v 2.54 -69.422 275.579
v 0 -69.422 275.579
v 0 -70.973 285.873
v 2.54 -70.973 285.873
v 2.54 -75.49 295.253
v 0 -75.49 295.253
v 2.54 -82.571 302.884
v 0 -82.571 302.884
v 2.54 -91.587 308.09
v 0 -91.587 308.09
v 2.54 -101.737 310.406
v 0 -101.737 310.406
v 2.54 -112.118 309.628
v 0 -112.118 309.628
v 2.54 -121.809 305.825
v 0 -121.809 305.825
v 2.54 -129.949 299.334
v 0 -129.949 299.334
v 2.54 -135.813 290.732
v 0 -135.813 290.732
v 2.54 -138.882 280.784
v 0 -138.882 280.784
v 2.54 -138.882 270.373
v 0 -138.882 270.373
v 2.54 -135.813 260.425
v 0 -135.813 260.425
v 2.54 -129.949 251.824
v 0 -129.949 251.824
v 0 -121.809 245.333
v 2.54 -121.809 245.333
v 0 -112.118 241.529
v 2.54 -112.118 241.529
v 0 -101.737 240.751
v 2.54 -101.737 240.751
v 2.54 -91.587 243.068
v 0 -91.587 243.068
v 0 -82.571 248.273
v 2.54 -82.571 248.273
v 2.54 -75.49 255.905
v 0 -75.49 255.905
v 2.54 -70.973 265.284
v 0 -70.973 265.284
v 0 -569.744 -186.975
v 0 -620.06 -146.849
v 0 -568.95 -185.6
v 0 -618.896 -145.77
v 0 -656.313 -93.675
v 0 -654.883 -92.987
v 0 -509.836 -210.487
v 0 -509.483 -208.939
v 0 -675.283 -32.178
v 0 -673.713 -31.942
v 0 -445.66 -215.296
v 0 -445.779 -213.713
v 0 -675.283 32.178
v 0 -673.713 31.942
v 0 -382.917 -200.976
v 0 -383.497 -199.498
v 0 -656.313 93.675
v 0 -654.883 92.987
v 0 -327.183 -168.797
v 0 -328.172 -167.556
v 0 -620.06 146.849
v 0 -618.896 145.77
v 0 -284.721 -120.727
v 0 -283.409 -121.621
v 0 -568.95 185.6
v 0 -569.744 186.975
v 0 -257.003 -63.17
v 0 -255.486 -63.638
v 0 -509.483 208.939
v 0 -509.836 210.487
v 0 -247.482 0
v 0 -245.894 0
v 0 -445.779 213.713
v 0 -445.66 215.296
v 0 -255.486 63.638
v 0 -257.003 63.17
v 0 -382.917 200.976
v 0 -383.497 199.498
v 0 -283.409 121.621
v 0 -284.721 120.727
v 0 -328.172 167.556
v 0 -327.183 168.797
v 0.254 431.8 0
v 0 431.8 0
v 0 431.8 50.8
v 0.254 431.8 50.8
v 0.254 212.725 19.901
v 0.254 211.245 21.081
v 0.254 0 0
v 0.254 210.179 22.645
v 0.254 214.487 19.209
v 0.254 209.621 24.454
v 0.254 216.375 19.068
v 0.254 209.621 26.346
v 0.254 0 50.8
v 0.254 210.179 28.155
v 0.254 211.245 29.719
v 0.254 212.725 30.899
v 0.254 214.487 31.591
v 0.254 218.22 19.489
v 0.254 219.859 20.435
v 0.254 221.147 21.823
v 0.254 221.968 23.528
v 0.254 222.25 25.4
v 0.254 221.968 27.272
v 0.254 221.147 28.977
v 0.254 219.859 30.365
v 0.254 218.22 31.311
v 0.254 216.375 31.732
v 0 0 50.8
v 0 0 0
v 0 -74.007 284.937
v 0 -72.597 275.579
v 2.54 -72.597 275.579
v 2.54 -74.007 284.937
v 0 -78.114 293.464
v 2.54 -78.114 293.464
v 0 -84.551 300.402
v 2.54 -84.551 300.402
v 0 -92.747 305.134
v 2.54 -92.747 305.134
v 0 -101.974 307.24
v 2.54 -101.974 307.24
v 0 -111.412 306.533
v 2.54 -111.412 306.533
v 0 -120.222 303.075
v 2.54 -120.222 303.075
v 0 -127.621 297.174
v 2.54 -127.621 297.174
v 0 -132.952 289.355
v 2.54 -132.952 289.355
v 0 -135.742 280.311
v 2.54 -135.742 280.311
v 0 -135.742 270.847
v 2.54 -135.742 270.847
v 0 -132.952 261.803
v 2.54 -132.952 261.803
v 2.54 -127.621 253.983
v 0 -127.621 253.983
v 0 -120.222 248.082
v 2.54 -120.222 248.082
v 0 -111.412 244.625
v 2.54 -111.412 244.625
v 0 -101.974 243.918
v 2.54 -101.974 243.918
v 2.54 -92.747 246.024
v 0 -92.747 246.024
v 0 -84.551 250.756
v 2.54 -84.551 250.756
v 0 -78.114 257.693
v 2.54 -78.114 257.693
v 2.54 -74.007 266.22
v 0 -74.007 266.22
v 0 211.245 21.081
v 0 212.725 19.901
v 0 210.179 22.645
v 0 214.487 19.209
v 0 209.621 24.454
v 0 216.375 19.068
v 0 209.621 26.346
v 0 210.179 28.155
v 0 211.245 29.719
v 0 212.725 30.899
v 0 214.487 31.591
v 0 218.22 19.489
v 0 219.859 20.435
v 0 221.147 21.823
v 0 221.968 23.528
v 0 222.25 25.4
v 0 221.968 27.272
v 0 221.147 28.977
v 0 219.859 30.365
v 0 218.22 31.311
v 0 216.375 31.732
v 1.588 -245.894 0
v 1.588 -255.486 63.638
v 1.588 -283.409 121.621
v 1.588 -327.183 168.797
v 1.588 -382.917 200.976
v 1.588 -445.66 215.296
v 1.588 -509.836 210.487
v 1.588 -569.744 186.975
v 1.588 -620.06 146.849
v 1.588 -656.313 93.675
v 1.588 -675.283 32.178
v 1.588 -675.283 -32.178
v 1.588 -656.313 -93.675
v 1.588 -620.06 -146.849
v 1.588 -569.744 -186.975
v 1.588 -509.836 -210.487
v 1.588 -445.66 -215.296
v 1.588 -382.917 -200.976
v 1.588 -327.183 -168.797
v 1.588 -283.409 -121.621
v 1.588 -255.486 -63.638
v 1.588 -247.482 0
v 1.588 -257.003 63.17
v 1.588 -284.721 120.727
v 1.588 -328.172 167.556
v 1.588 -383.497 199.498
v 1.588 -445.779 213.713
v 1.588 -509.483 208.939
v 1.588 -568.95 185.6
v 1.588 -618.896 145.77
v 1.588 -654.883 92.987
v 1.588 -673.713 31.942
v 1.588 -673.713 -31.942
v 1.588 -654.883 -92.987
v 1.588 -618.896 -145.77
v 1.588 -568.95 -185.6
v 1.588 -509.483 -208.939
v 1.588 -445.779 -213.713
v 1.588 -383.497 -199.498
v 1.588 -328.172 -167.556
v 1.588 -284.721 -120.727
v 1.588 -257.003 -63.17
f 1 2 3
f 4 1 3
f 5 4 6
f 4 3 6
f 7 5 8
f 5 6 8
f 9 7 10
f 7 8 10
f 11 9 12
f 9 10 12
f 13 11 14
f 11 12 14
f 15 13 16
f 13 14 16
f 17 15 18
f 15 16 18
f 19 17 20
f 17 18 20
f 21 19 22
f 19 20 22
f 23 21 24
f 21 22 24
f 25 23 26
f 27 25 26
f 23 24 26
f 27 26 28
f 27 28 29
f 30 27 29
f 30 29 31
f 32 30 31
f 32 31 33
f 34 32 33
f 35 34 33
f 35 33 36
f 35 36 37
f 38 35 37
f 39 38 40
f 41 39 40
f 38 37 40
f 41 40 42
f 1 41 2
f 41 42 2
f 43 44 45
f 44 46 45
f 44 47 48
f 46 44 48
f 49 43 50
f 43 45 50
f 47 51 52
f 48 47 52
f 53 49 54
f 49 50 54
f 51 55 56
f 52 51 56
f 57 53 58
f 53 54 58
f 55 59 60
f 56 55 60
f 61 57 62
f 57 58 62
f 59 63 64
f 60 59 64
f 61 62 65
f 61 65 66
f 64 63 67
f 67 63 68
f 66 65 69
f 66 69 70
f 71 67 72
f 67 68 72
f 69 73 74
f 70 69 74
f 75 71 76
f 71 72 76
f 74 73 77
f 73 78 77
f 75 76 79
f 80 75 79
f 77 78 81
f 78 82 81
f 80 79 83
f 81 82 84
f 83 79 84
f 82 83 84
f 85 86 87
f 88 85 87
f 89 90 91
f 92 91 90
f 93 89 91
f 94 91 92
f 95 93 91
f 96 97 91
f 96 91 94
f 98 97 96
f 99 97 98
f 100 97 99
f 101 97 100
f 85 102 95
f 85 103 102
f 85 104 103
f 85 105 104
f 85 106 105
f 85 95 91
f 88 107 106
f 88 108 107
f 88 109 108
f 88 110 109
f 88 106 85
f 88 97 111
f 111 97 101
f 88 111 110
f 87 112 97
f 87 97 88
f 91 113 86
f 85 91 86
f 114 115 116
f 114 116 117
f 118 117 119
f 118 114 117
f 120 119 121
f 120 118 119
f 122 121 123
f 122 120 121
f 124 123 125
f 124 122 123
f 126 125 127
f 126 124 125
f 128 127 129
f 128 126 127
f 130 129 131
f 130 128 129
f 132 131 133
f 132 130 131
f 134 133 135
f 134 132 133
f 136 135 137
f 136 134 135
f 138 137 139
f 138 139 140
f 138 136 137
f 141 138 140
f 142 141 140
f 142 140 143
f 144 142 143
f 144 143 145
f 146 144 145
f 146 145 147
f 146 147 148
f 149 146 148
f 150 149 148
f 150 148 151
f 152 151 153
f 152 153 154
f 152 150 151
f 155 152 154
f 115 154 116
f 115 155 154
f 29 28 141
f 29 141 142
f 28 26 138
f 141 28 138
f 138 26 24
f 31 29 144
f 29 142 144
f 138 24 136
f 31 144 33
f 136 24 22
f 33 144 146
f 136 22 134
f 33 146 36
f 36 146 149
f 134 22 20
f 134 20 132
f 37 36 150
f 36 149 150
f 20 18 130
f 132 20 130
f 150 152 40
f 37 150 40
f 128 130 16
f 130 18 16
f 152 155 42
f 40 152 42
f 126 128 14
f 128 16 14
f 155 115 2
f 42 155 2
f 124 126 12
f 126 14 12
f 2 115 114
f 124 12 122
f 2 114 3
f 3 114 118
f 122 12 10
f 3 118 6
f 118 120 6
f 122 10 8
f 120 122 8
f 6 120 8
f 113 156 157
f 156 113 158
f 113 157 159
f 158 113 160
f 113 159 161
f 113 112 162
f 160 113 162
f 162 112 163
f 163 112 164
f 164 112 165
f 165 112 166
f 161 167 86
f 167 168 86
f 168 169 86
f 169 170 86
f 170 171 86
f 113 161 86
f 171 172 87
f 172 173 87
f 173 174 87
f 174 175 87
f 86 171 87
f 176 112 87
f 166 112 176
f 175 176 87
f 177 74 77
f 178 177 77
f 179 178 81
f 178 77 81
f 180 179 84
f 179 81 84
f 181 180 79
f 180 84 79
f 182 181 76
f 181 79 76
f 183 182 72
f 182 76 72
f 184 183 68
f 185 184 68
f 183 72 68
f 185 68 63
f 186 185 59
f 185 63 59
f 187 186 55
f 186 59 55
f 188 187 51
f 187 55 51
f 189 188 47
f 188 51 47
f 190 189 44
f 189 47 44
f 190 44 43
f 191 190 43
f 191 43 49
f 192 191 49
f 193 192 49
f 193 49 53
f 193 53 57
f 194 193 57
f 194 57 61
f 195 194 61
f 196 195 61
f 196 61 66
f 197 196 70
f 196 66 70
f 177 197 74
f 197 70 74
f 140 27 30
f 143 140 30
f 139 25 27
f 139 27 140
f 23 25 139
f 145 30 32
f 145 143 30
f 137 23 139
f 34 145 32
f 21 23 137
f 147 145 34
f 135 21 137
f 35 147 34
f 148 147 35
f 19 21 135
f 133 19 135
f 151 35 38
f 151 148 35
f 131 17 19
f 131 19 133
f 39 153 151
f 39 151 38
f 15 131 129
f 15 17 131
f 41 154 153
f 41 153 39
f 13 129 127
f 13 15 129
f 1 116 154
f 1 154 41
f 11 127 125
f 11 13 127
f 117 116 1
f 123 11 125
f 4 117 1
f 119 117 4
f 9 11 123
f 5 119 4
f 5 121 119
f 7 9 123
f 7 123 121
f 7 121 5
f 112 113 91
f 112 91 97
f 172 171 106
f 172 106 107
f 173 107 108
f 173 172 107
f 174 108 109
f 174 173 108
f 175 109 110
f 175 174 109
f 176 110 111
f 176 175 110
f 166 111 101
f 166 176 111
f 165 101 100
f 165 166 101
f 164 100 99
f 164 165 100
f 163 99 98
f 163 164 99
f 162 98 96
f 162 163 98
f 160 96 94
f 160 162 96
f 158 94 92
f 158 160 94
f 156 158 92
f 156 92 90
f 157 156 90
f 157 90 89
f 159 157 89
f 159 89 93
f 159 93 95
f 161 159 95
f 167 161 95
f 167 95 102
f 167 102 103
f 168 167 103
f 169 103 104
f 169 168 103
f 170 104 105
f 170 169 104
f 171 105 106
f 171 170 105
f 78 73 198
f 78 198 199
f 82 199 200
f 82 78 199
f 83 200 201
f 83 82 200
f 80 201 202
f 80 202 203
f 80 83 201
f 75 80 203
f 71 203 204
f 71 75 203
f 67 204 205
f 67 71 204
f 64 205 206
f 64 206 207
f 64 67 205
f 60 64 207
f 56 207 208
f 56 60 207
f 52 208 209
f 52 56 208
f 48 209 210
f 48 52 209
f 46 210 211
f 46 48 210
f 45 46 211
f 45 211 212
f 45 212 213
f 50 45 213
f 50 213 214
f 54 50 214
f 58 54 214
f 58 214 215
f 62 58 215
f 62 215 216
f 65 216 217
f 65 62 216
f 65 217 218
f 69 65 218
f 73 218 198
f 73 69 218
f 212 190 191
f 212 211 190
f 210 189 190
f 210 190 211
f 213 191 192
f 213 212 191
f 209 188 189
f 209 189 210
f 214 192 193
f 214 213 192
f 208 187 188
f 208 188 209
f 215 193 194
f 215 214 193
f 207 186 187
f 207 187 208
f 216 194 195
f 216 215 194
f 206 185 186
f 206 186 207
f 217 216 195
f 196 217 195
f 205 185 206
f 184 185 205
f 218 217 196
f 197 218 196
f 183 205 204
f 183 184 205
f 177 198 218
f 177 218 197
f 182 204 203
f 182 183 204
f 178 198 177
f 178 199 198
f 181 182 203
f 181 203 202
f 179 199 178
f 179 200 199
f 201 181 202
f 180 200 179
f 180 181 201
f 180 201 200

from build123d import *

# Parameters (mm, degrees)
F0_W     = 431.8
F0_H     = 50.8
F0_R     = 6.35
F1_DEPTH = 0.254
F2_R     = 215.9
F2_R_2   = 214.3125
F3_DEPTH = 1.5875
F4_R     = 34.925
F4_R_2   = 31.75
F5_DEPTH = 2.54


# Not quite as in the source:
# - a feature names something its author has since deleted; it is built from what else it names


with BuildPart() as f1:
    # F0 (on Right) → F1 (new body)
    with BuildSketch(Plane.YZ):
        with Locations((215.9, 25.4)):
            Rectangle(F0_W, F0_H)
        with Locations((215.9, 25.4)):
            Circle(F0_R, mode=Mode.SUBTRACT)
    extrude(amount=F1_DEPTH)


with BuildPart() as f3:
    # F2 (on Right) → F3 (new body)
    with BuildSketch(Plane.YZ):
        with Locations((-461.7941379547, 0)):
            Circle(F2_R)
        with Locations((-461.7941379547, 0)):
            Circle(F2_R_2, mode=Mode.SUBTRACT)
    extrude(amount=F3_DEPTH)


with BuildPart() as f5:
    # F4 (on Right) → F5 (new body)
    with BuildSketch(Plane.YZ):
        with Locations((-104.3467223644, 275.5787670612)):
            Circle(F4_R)
        with Locations((-104.3467223644, 275.5787670612)):
            Circle(F4_R_2, mode=Mode.SUBTRACT)
    extrude(amount=F5_DEPTH)


solid = Compound([f1.part, f3.part, f5.part])
